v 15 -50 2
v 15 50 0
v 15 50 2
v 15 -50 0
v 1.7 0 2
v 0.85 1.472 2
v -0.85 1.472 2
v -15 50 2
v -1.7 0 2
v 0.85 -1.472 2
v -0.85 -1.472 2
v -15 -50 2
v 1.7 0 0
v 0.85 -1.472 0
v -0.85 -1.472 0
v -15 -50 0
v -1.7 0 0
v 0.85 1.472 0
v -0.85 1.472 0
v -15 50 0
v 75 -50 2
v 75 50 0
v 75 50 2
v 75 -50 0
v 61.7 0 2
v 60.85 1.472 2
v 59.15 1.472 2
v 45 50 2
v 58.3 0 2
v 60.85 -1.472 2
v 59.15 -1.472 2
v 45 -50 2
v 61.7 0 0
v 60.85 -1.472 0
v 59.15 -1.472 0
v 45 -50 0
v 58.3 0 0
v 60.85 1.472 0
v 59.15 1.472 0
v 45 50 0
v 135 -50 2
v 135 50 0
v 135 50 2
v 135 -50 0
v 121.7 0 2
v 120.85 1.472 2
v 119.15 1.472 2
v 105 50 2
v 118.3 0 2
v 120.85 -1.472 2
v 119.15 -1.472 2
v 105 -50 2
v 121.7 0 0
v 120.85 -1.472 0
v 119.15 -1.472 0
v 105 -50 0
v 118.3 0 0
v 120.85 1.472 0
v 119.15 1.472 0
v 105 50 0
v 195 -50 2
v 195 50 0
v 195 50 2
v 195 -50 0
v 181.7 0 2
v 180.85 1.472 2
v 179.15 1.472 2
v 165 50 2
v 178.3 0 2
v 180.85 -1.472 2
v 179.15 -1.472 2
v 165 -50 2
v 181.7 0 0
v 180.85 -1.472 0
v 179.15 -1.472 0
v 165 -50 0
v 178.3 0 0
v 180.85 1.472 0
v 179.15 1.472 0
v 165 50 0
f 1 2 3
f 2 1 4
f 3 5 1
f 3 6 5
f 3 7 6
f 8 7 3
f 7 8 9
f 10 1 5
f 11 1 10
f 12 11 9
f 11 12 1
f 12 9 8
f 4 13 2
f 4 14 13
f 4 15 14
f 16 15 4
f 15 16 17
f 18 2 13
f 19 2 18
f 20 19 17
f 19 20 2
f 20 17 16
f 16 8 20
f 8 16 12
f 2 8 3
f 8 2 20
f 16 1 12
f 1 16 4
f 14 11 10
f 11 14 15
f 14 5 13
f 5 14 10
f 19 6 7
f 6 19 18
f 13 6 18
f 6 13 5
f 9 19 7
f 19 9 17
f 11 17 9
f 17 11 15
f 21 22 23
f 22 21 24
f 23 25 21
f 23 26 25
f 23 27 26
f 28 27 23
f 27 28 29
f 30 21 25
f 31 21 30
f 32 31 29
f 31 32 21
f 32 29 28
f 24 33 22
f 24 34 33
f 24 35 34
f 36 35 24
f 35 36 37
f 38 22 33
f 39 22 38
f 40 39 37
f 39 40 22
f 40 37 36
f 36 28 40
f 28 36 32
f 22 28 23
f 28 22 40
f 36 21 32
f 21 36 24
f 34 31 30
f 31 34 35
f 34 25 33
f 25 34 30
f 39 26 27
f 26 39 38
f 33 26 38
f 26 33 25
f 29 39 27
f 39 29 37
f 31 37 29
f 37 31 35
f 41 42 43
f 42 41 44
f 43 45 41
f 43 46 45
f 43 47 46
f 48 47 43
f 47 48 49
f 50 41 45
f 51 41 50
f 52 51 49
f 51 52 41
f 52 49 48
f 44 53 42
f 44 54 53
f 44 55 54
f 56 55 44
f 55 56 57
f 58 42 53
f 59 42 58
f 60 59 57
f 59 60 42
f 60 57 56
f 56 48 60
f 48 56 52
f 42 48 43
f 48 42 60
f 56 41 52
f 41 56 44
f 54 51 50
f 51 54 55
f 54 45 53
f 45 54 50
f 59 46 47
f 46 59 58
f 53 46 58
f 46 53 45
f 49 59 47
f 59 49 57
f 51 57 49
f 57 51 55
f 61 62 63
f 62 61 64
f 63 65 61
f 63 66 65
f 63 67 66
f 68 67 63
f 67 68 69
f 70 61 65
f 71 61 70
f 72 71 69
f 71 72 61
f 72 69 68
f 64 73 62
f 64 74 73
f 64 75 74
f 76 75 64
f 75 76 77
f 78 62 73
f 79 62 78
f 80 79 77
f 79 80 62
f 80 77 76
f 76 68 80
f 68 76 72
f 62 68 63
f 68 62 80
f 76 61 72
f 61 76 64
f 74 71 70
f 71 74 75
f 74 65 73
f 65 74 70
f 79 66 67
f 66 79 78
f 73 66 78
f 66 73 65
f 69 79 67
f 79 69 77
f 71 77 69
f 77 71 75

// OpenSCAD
// file: Bohrung.scad
// Andre Betz
// github@AndreBetz.de
SchraubeM2 = 2.4;
SchraubeM3 = 3.4;

module Bohrloch(Durchmesser,posX,posY,Hoehe) 
{
    translate([posX,posY,-1])
        cylinder(
            Hoehe,
            Durchmesser/2,
            Durchmesser/2,
            center = false);
}
// main file
// Andre Betz
// github@AndreBetz.de
include <Bohrung.scad>

module Seitenhalter()
{
    Laenge = 30;
    Breite = 100;
    Hoehe  = 2;
    
    difference() 
    {
        translate([-Laenge/2,-Breite/2,0])
            cube([Laenge,Breite,Hoehe]);        
        Bohrloch(SchraubeM3,0,0,Hoehe*3);
    }
    translate([Laenge*2,0,0])
    difference() 
    {
        translate([-Laenge/2,-Breite/2,0])
            cube([Laenge,Breite,Hoehe]);        
        Bohrloch(SchraubeM3,0,0,Hoehe*3);
    }
    translate([Laenge*4,0,0])
    difference() 
    {
        translate([-Laenge/2,-Breite/2,0])
            cube([Laenge,Breite,Hoehe]);        
        Bohrloch(SchraubeM3,0,0,Hoehe*3);
    }
    translate([Laenge*6,0,0])
    difference() 
    {
        translate([-Laenge/2,-Breite/2,0])
            cube([Laenge,Breite,Hoehe]);        
        Bohrloch(SchraubeM3,0,0,Hoehe*3);
    }
}

Seitenhalter();
